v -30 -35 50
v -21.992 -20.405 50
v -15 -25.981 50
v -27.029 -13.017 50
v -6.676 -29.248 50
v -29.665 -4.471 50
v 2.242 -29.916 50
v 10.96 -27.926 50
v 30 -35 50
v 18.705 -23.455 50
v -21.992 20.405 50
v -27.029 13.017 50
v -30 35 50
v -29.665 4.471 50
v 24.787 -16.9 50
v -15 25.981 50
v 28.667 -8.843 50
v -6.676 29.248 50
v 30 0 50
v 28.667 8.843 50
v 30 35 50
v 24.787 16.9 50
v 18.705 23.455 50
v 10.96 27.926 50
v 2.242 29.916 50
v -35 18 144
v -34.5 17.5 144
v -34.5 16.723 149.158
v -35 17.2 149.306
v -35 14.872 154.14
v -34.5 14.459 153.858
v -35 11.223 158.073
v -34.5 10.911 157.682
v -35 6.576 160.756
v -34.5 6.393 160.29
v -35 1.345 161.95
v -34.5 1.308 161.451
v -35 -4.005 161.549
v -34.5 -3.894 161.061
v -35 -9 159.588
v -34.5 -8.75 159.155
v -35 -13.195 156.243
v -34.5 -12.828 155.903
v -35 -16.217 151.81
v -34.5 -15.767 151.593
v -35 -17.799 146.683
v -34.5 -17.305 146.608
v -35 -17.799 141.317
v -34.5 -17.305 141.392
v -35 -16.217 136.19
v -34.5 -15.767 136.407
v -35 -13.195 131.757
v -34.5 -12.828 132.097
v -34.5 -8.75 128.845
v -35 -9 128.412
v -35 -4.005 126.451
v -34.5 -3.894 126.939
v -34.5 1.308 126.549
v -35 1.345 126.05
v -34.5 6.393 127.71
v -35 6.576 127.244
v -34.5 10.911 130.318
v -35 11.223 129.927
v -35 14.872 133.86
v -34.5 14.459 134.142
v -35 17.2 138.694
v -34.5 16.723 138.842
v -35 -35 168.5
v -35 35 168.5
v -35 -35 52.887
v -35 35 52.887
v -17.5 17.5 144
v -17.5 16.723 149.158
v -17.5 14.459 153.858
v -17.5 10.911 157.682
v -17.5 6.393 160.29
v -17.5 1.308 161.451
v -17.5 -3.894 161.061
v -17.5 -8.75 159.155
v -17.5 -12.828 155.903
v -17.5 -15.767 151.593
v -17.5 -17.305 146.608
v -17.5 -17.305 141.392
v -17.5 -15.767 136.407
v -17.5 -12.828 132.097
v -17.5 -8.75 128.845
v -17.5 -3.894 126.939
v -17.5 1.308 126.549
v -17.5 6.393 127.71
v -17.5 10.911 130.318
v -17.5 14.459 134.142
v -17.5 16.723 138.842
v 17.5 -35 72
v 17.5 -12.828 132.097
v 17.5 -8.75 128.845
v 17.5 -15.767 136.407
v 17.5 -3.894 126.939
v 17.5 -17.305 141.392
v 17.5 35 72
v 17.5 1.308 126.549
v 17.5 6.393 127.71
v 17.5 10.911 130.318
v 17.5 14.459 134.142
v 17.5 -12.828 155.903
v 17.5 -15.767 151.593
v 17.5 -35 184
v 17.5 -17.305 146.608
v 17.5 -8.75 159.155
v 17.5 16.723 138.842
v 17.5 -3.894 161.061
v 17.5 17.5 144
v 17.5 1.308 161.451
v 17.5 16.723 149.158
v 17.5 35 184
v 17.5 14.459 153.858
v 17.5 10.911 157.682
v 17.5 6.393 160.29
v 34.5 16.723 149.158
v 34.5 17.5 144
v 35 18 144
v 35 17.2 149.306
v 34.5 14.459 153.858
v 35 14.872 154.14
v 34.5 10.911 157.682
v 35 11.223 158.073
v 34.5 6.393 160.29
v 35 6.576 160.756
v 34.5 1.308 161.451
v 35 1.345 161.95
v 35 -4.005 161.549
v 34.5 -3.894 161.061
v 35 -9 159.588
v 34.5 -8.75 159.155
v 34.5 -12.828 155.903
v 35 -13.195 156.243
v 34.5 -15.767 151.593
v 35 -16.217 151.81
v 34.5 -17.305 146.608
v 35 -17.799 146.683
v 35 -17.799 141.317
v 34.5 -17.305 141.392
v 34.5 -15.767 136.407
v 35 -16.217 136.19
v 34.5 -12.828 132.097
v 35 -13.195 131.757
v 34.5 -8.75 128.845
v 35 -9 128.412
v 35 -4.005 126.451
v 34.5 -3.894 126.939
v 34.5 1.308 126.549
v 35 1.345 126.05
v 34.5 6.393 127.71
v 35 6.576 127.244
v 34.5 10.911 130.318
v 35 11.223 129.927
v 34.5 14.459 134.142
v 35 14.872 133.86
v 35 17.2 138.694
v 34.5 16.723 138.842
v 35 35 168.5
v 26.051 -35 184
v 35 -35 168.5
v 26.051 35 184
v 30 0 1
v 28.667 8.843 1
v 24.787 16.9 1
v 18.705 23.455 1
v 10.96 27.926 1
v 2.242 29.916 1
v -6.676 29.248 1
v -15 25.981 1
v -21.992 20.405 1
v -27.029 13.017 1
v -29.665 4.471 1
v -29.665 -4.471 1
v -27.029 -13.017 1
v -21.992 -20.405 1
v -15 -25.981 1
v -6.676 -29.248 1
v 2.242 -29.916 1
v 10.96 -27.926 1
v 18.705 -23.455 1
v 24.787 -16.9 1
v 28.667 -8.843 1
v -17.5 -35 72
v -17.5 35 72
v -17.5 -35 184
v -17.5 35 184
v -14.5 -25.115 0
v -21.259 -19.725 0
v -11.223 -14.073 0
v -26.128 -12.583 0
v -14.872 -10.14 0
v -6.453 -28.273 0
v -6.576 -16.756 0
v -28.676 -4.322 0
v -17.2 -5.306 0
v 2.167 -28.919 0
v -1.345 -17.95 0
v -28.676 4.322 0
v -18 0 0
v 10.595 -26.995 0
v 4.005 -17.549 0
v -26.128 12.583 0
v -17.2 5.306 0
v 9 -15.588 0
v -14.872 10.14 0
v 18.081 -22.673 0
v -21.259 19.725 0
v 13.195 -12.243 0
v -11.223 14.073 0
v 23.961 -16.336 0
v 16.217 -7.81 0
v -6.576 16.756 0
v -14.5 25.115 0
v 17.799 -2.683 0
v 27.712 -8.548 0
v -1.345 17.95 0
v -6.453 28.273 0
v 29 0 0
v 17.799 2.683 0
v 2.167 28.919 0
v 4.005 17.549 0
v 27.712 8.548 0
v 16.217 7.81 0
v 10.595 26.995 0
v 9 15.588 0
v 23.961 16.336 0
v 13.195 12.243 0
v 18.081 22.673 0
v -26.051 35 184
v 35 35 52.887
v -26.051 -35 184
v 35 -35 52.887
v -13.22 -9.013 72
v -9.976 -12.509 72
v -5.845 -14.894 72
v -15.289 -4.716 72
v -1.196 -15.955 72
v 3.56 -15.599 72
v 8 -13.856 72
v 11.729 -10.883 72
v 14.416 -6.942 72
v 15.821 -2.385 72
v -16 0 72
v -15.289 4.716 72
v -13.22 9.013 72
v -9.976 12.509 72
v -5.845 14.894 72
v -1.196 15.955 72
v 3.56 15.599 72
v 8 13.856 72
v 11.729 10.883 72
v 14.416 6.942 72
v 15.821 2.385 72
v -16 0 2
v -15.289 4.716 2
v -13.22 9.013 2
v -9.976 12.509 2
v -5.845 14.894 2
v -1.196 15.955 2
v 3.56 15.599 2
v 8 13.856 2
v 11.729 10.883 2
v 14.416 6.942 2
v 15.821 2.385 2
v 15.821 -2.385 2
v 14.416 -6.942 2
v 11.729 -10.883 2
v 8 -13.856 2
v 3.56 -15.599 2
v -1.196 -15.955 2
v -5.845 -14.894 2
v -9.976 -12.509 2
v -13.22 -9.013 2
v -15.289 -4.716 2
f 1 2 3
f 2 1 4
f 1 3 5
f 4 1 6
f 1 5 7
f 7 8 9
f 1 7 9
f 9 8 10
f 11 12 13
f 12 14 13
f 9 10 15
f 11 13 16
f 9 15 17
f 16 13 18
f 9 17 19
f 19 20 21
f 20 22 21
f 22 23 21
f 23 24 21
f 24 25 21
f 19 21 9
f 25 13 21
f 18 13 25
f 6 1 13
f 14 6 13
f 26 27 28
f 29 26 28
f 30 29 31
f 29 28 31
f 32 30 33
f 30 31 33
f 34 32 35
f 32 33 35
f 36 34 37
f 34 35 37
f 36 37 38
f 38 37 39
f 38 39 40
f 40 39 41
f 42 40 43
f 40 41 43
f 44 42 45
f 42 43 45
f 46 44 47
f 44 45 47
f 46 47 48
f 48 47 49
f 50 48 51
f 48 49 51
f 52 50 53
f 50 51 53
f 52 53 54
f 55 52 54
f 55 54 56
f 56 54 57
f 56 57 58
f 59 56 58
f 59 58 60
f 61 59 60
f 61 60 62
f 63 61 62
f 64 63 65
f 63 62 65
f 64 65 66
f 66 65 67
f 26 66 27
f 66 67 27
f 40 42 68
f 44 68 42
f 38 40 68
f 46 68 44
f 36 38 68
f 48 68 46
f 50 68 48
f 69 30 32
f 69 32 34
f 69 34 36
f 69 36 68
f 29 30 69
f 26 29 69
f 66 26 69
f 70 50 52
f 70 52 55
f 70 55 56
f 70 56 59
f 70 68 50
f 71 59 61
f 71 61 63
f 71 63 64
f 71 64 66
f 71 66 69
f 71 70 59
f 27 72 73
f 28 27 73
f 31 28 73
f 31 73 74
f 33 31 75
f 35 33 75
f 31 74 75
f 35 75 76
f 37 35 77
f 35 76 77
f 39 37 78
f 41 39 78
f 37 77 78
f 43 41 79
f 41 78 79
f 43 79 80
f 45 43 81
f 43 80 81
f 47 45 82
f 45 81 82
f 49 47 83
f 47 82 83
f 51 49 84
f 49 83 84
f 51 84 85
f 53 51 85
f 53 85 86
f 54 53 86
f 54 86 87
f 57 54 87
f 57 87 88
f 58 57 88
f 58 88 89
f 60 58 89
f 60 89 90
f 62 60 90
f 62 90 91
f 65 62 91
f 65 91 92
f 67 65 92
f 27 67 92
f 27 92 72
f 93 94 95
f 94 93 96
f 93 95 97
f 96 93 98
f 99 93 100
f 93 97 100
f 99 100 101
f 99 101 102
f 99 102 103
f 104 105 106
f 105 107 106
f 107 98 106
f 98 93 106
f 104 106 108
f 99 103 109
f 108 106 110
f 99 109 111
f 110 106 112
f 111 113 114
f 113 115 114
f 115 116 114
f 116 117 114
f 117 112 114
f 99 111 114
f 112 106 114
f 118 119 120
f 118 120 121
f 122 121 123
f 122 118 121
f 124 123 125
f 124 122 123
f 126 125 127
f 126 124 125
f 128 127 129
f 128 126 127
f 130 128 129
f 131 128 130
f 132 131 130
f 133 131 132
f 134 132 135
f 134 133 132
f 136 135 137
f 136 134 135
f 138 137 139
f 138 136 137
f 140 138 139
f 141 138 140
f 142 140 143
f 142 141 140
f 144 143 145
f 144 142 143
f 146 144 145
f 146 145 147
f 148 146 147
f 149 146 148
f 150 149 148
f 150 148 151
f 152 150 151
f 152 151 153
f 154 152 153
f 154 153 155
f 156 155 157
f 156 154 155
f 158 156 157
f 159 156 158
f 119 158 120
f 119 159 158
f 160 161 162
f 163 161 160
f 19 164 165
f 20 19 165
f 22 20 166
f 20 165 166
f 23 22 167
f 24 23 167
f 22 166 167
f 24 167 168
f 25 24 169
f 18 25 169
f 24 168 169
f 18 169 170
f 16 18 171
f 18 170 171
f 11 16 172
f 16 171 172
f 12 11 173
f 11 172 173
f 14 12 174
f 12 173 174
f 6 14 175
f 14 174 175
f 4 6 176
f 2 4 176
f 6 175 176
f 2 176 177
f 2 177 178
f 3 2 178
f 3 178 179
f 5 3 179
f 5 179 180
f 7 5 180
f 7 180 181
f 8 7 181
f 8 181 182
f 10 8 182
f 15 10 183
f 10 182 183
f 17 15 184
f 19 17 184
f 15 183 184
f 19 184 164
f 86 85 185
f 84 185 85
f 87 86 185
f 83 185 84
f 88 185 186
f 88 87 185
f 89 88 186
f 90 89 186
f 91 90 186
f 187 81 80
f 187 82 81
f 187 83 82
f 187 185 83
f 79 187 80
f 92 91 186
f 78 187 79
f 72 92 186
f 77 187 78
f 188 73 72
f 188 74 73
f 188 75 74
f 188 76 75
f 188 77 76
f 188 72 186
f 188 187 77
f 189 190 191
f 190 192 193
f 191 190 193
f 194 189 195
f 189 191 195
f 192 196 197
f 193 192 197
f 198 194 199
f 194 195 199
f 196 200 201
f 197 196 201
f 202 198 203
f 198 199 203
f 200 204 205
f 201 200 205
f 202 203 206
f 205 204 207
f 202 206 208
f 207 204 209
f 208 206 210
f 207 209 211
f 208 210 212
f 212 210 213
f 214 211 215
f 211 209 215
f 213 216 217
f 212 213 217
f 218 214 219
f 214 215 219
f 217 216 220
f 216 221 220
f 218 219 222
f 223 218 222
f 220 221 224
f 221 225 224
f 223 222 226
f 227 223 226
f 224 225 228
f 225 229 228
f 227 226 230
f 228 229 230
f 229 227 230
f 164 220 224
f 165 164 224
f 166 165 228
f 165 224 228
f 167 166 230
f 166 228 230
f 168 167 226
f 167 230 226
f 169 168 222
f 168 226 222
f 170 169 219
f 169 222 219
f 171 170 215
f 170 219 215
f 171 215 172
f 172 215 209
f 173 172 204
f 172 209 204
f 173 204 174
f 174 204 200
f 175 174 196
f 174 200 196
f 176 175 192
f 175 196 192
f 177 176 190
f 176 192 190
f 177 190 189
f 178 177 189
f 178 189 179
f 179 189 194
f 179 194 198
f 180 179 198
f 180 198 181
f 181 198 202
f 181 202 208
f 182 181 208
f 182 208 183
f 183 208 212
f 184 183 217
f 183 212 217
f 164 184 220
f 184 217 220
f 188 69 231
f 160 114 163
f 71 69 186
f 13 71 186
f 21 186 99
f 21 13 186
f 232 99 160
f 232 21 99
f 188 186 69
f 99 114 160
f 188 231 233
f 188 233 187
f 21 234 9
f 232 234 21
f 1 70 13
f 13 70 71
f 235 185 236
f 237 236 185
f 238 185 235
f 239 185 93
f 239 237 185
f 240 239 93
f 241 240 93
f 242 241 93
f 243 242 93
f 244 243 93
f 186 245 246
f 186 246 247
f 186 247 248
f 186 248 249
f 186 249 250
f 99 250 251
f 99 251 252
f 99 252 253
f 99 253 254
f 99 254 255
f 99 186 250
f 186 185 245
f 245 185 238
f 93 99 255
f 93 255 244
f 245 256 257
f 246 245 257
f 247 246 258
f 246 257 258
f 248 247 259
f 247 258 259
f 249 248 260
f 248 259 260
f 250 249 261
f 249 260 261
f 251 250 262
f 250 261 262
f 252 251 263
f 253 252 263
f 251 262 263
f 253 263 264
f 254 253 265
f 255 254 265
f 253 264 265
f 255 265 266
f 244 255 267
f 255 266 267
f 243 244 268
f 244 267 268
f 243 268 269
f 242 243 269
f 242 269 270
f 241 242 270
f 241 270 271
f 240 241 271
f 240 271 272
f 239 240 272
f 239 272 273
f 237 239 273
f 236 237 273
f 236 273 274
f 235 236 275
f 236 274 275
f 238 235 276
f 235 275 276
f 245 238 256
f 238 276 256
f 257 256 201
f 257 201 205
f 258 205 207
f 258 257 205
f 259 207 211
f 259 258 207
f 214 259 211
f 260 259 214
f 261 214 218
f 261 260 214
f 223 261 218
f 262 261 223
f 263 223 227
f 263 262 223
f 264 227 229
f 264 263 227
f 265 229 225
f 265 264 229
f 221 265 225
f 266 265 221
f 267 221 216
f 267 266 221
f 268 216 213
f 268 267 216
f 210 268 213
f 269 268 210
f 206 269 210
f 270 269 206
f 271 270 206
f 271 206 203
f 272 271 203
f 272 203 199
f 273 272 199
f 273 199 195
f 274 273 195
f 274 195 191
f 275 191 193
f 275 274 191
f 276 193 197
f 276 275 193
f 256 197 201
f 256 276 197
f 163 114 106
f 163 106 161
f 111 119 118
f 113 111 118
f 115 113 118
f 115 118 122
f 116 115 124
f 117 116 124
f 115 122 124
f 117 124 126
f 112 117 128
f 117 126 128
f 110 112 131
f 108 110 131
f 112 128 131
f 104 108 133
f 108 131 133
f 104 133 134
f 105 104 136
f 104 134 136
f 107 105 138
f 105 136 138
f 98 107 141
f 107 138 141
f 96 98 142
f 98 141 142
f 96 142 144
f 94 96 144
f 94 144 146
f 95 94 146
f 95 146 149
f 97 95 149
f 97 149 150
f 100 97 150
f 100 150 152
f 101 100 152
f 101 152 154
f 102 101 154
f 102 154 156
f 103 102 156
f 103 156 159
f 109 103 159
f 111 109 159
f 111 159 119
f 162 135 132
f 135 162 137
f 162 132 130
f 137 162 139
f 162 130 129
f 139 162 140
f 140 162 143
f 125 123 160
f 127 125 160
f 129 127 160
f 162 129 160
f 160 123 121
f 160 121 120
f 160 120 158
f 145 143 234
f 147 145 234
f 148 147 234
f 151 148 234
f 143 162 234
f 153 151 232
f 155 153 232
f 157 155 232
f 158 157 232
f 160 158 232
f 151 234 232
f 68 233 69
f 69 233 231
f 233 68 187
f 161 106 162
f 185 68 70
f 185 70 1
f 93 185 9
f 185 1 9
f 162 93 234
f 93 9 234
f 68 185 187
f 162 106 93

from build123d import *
from OCP.BRepFilletAPI import BRepFilletAPI_MakeChamfer

# Parameters (mm, degrees)
SKETCH2_R           = 30
BOSS_EXTRUDE1_DEPTH = 50
SKETCH3_W           = 70
SKETCH3_H           = 70
BOSS_EXTRUDE2_DEPTH = 134
SKETCH4_W           = 35
SKETCH4_H           = 70
CUT_EXTRUDE1_DEPTH  = 112
SKETCH5_R           = 16
CUT_EXTRUDE2_DEPTH  = 72
CHAMFER1_SIZE       = 15.5
CHAMFER1_SIZE2      = 8.948929172
SKETCH6_R           = 17.5
CUT_EXTRUDE3_DEPTH  = 70
CHAMFER2_SIZE       = 0.5
CHAMFER4_SIZE       = 1
CHAMFER6_SIZE       = 2
CHAMFER7_SIZE       = 5
CHAMFER7_SIZE_2     = 2.886751346


with BuildPart() as part:
    # Sketch2 → Boss-Extrude1 (new body)
    with BuildSketch(Plane.XY):
        Circle(SKETCH2_R)
    extrude(amount=BOSS_EXTRUDE1_DEPTH)

    # Sketch3 → Boss-Extrude2 (add)
    with BuildSketch(Plane.XY.offset(50)):
        Rectangle(SKETCH3_W, SKETCH3_H)
    extrude(amount=BOSS_EXTRUDE2_DEPTH)

    # Sketch4 → Cut-Extrude1 (cut)
    with BuildSketch(Plane.XY.offset(184)):
        Rectangle(SKETCH4_W, SKETCH4_H)
    extrude(amount=-CUT_EXTRUDE1_DEPTH, mode=Mode.SUBTRACT)

    # Sketch5 → Cut-Extrude2 (cut)
    with BuildSketch(Plane(origin=(0, 0, 0), x_dir=(-1, 0, 0), z_dir=(0, 0, -1))):
        Circle(SKETCH5_R)
    extrude(amount=-CUT_EXTRUDE2_DEPTH, mode=Mode.SUBTRACT)

    # Chamfer1: one chamfer whose edges measure the first distance from different faces: ONE call of the kernel's chamfer builder (chamfer() names one face for all edges)
    chamfer1_edges_1 = [part.edges().sort_by_distance(p)[0] for p in [
        (-35, 0, 184),
    ]]
    chamfer1_side_1 = [part.faces().sort_by_distance(p)[0] for p in [
        (-35, 0, 117),
    ]]
    chamfer1_edges_2 = [part.edges().sort_by_distance(p)[0] for p in [
        (35, 0, 184),
    ]]
    chamfer1_side_2 = [part.faces().sort_by_distance(p)[0] for p in [
        (35, 0, 117),
    ]]
    chamfer1 = BRepFilletAPI_MakeChamfer(part.part.solid().wrapped)
    for e in chamfer1_edges_1:
        chamfer1.Add(CHAMFER1_SIZE, CHAMFER1_SIZE2, e.wrapped, chamfer1_side_1[0].wrapped)  # the first distance lies on this face
    for e in chamfer1_edges_2:
        chamfer1.Add(CHAMFER1_SIZE, CHAMFER1_SIZE2, e.wrapped, chamfer1_side_2[0].wrapped)  # the first distance lies on this face
    add(Compound.cast(chamfer1.Shape()), mode=Mode.REPLACE)

    # Sketch6 → Cut-Extrude3 (cut)
    with BuildSketch(Plane(origin=(35, 0, 0), x_dir=(0, 0, -1), z_dir=(1, 0, 0))):
        with Locations(Location((-144, 0, 0), (0, 0, 90))):
            Circle(SKETCH6_R)
    extrude(amount=-CUT_EXTRUDE3_DEPTH, mode=Mode.SUBTRACT)

    # Chamfer2
    chamfer2_edges = [part.edges().sort_by_distance(p)[0] for p in [
        (-35, -17.5, 144),
        (35, -17.5, 144),
    ]]
    chamfer(chamfer2_edges, length=CHAMFER2_SIZE)

    # Chamfer4
    chamfer4_edges = [part.edges().sort_by_distance(p)[0] for p in [
        (-30, 0, 0),
    ]]
    chamfer(chamfer4_edges, length=CHAMFER4_SIZE)

    # Chamfer6
    chamfer6_edges = [part.edges().sort_by_distance(p)[0] for p in [
        (16, 0, 0),
    ]]
    chamfer(chamfer6_edges, length=CHAMFER6_SIZE)

    # Chamfer7
    chamfer7_edges_1 = [part.edges().sort_by_distance(p)[0] for p in [
        (-35, 0, 50),
    ]]
    chamfer7_side_1 = [part.faces().sort_by_distance(p)[0] for p in [
        (-34.942264973, 0, 50),
    ]]
    chamfer7_edges_2 = [part.edges().sort_by_distance(p)[0] for p in [
        (35, 0, 50),
    ]]
    chamfer7_side_2 = [part.faces().sort_by_distance(p)[0] for p in [
        (34.942264973, 0, 50),
    ]]
    chamfer7 = BRepFilletAPI_MakeChamfer(part.part.solid().wrapped)
    for e in chamfer7_edges_1:
        chamfer7.Add(CHAMFER7_SIZE - 0.0001, CHAMFER7_SIZE_2 - 0.0001, e.wrapped, chamfer7_side_1[0].wrapped)
    for e in chamfer7_edges_2:
        chamfer7.Add(CHAMFER7_SIZE - 0.0001, CHAMFER7_SIZE_2 - 0.0001, e.wrapped, chamfer7_side_2[0].wrapped)
    add(Compound.cast(chamfer7.Shape()), mode=Mode.REPLACE)  # a hair under: the kernel refuses the full size


solid = part.part
